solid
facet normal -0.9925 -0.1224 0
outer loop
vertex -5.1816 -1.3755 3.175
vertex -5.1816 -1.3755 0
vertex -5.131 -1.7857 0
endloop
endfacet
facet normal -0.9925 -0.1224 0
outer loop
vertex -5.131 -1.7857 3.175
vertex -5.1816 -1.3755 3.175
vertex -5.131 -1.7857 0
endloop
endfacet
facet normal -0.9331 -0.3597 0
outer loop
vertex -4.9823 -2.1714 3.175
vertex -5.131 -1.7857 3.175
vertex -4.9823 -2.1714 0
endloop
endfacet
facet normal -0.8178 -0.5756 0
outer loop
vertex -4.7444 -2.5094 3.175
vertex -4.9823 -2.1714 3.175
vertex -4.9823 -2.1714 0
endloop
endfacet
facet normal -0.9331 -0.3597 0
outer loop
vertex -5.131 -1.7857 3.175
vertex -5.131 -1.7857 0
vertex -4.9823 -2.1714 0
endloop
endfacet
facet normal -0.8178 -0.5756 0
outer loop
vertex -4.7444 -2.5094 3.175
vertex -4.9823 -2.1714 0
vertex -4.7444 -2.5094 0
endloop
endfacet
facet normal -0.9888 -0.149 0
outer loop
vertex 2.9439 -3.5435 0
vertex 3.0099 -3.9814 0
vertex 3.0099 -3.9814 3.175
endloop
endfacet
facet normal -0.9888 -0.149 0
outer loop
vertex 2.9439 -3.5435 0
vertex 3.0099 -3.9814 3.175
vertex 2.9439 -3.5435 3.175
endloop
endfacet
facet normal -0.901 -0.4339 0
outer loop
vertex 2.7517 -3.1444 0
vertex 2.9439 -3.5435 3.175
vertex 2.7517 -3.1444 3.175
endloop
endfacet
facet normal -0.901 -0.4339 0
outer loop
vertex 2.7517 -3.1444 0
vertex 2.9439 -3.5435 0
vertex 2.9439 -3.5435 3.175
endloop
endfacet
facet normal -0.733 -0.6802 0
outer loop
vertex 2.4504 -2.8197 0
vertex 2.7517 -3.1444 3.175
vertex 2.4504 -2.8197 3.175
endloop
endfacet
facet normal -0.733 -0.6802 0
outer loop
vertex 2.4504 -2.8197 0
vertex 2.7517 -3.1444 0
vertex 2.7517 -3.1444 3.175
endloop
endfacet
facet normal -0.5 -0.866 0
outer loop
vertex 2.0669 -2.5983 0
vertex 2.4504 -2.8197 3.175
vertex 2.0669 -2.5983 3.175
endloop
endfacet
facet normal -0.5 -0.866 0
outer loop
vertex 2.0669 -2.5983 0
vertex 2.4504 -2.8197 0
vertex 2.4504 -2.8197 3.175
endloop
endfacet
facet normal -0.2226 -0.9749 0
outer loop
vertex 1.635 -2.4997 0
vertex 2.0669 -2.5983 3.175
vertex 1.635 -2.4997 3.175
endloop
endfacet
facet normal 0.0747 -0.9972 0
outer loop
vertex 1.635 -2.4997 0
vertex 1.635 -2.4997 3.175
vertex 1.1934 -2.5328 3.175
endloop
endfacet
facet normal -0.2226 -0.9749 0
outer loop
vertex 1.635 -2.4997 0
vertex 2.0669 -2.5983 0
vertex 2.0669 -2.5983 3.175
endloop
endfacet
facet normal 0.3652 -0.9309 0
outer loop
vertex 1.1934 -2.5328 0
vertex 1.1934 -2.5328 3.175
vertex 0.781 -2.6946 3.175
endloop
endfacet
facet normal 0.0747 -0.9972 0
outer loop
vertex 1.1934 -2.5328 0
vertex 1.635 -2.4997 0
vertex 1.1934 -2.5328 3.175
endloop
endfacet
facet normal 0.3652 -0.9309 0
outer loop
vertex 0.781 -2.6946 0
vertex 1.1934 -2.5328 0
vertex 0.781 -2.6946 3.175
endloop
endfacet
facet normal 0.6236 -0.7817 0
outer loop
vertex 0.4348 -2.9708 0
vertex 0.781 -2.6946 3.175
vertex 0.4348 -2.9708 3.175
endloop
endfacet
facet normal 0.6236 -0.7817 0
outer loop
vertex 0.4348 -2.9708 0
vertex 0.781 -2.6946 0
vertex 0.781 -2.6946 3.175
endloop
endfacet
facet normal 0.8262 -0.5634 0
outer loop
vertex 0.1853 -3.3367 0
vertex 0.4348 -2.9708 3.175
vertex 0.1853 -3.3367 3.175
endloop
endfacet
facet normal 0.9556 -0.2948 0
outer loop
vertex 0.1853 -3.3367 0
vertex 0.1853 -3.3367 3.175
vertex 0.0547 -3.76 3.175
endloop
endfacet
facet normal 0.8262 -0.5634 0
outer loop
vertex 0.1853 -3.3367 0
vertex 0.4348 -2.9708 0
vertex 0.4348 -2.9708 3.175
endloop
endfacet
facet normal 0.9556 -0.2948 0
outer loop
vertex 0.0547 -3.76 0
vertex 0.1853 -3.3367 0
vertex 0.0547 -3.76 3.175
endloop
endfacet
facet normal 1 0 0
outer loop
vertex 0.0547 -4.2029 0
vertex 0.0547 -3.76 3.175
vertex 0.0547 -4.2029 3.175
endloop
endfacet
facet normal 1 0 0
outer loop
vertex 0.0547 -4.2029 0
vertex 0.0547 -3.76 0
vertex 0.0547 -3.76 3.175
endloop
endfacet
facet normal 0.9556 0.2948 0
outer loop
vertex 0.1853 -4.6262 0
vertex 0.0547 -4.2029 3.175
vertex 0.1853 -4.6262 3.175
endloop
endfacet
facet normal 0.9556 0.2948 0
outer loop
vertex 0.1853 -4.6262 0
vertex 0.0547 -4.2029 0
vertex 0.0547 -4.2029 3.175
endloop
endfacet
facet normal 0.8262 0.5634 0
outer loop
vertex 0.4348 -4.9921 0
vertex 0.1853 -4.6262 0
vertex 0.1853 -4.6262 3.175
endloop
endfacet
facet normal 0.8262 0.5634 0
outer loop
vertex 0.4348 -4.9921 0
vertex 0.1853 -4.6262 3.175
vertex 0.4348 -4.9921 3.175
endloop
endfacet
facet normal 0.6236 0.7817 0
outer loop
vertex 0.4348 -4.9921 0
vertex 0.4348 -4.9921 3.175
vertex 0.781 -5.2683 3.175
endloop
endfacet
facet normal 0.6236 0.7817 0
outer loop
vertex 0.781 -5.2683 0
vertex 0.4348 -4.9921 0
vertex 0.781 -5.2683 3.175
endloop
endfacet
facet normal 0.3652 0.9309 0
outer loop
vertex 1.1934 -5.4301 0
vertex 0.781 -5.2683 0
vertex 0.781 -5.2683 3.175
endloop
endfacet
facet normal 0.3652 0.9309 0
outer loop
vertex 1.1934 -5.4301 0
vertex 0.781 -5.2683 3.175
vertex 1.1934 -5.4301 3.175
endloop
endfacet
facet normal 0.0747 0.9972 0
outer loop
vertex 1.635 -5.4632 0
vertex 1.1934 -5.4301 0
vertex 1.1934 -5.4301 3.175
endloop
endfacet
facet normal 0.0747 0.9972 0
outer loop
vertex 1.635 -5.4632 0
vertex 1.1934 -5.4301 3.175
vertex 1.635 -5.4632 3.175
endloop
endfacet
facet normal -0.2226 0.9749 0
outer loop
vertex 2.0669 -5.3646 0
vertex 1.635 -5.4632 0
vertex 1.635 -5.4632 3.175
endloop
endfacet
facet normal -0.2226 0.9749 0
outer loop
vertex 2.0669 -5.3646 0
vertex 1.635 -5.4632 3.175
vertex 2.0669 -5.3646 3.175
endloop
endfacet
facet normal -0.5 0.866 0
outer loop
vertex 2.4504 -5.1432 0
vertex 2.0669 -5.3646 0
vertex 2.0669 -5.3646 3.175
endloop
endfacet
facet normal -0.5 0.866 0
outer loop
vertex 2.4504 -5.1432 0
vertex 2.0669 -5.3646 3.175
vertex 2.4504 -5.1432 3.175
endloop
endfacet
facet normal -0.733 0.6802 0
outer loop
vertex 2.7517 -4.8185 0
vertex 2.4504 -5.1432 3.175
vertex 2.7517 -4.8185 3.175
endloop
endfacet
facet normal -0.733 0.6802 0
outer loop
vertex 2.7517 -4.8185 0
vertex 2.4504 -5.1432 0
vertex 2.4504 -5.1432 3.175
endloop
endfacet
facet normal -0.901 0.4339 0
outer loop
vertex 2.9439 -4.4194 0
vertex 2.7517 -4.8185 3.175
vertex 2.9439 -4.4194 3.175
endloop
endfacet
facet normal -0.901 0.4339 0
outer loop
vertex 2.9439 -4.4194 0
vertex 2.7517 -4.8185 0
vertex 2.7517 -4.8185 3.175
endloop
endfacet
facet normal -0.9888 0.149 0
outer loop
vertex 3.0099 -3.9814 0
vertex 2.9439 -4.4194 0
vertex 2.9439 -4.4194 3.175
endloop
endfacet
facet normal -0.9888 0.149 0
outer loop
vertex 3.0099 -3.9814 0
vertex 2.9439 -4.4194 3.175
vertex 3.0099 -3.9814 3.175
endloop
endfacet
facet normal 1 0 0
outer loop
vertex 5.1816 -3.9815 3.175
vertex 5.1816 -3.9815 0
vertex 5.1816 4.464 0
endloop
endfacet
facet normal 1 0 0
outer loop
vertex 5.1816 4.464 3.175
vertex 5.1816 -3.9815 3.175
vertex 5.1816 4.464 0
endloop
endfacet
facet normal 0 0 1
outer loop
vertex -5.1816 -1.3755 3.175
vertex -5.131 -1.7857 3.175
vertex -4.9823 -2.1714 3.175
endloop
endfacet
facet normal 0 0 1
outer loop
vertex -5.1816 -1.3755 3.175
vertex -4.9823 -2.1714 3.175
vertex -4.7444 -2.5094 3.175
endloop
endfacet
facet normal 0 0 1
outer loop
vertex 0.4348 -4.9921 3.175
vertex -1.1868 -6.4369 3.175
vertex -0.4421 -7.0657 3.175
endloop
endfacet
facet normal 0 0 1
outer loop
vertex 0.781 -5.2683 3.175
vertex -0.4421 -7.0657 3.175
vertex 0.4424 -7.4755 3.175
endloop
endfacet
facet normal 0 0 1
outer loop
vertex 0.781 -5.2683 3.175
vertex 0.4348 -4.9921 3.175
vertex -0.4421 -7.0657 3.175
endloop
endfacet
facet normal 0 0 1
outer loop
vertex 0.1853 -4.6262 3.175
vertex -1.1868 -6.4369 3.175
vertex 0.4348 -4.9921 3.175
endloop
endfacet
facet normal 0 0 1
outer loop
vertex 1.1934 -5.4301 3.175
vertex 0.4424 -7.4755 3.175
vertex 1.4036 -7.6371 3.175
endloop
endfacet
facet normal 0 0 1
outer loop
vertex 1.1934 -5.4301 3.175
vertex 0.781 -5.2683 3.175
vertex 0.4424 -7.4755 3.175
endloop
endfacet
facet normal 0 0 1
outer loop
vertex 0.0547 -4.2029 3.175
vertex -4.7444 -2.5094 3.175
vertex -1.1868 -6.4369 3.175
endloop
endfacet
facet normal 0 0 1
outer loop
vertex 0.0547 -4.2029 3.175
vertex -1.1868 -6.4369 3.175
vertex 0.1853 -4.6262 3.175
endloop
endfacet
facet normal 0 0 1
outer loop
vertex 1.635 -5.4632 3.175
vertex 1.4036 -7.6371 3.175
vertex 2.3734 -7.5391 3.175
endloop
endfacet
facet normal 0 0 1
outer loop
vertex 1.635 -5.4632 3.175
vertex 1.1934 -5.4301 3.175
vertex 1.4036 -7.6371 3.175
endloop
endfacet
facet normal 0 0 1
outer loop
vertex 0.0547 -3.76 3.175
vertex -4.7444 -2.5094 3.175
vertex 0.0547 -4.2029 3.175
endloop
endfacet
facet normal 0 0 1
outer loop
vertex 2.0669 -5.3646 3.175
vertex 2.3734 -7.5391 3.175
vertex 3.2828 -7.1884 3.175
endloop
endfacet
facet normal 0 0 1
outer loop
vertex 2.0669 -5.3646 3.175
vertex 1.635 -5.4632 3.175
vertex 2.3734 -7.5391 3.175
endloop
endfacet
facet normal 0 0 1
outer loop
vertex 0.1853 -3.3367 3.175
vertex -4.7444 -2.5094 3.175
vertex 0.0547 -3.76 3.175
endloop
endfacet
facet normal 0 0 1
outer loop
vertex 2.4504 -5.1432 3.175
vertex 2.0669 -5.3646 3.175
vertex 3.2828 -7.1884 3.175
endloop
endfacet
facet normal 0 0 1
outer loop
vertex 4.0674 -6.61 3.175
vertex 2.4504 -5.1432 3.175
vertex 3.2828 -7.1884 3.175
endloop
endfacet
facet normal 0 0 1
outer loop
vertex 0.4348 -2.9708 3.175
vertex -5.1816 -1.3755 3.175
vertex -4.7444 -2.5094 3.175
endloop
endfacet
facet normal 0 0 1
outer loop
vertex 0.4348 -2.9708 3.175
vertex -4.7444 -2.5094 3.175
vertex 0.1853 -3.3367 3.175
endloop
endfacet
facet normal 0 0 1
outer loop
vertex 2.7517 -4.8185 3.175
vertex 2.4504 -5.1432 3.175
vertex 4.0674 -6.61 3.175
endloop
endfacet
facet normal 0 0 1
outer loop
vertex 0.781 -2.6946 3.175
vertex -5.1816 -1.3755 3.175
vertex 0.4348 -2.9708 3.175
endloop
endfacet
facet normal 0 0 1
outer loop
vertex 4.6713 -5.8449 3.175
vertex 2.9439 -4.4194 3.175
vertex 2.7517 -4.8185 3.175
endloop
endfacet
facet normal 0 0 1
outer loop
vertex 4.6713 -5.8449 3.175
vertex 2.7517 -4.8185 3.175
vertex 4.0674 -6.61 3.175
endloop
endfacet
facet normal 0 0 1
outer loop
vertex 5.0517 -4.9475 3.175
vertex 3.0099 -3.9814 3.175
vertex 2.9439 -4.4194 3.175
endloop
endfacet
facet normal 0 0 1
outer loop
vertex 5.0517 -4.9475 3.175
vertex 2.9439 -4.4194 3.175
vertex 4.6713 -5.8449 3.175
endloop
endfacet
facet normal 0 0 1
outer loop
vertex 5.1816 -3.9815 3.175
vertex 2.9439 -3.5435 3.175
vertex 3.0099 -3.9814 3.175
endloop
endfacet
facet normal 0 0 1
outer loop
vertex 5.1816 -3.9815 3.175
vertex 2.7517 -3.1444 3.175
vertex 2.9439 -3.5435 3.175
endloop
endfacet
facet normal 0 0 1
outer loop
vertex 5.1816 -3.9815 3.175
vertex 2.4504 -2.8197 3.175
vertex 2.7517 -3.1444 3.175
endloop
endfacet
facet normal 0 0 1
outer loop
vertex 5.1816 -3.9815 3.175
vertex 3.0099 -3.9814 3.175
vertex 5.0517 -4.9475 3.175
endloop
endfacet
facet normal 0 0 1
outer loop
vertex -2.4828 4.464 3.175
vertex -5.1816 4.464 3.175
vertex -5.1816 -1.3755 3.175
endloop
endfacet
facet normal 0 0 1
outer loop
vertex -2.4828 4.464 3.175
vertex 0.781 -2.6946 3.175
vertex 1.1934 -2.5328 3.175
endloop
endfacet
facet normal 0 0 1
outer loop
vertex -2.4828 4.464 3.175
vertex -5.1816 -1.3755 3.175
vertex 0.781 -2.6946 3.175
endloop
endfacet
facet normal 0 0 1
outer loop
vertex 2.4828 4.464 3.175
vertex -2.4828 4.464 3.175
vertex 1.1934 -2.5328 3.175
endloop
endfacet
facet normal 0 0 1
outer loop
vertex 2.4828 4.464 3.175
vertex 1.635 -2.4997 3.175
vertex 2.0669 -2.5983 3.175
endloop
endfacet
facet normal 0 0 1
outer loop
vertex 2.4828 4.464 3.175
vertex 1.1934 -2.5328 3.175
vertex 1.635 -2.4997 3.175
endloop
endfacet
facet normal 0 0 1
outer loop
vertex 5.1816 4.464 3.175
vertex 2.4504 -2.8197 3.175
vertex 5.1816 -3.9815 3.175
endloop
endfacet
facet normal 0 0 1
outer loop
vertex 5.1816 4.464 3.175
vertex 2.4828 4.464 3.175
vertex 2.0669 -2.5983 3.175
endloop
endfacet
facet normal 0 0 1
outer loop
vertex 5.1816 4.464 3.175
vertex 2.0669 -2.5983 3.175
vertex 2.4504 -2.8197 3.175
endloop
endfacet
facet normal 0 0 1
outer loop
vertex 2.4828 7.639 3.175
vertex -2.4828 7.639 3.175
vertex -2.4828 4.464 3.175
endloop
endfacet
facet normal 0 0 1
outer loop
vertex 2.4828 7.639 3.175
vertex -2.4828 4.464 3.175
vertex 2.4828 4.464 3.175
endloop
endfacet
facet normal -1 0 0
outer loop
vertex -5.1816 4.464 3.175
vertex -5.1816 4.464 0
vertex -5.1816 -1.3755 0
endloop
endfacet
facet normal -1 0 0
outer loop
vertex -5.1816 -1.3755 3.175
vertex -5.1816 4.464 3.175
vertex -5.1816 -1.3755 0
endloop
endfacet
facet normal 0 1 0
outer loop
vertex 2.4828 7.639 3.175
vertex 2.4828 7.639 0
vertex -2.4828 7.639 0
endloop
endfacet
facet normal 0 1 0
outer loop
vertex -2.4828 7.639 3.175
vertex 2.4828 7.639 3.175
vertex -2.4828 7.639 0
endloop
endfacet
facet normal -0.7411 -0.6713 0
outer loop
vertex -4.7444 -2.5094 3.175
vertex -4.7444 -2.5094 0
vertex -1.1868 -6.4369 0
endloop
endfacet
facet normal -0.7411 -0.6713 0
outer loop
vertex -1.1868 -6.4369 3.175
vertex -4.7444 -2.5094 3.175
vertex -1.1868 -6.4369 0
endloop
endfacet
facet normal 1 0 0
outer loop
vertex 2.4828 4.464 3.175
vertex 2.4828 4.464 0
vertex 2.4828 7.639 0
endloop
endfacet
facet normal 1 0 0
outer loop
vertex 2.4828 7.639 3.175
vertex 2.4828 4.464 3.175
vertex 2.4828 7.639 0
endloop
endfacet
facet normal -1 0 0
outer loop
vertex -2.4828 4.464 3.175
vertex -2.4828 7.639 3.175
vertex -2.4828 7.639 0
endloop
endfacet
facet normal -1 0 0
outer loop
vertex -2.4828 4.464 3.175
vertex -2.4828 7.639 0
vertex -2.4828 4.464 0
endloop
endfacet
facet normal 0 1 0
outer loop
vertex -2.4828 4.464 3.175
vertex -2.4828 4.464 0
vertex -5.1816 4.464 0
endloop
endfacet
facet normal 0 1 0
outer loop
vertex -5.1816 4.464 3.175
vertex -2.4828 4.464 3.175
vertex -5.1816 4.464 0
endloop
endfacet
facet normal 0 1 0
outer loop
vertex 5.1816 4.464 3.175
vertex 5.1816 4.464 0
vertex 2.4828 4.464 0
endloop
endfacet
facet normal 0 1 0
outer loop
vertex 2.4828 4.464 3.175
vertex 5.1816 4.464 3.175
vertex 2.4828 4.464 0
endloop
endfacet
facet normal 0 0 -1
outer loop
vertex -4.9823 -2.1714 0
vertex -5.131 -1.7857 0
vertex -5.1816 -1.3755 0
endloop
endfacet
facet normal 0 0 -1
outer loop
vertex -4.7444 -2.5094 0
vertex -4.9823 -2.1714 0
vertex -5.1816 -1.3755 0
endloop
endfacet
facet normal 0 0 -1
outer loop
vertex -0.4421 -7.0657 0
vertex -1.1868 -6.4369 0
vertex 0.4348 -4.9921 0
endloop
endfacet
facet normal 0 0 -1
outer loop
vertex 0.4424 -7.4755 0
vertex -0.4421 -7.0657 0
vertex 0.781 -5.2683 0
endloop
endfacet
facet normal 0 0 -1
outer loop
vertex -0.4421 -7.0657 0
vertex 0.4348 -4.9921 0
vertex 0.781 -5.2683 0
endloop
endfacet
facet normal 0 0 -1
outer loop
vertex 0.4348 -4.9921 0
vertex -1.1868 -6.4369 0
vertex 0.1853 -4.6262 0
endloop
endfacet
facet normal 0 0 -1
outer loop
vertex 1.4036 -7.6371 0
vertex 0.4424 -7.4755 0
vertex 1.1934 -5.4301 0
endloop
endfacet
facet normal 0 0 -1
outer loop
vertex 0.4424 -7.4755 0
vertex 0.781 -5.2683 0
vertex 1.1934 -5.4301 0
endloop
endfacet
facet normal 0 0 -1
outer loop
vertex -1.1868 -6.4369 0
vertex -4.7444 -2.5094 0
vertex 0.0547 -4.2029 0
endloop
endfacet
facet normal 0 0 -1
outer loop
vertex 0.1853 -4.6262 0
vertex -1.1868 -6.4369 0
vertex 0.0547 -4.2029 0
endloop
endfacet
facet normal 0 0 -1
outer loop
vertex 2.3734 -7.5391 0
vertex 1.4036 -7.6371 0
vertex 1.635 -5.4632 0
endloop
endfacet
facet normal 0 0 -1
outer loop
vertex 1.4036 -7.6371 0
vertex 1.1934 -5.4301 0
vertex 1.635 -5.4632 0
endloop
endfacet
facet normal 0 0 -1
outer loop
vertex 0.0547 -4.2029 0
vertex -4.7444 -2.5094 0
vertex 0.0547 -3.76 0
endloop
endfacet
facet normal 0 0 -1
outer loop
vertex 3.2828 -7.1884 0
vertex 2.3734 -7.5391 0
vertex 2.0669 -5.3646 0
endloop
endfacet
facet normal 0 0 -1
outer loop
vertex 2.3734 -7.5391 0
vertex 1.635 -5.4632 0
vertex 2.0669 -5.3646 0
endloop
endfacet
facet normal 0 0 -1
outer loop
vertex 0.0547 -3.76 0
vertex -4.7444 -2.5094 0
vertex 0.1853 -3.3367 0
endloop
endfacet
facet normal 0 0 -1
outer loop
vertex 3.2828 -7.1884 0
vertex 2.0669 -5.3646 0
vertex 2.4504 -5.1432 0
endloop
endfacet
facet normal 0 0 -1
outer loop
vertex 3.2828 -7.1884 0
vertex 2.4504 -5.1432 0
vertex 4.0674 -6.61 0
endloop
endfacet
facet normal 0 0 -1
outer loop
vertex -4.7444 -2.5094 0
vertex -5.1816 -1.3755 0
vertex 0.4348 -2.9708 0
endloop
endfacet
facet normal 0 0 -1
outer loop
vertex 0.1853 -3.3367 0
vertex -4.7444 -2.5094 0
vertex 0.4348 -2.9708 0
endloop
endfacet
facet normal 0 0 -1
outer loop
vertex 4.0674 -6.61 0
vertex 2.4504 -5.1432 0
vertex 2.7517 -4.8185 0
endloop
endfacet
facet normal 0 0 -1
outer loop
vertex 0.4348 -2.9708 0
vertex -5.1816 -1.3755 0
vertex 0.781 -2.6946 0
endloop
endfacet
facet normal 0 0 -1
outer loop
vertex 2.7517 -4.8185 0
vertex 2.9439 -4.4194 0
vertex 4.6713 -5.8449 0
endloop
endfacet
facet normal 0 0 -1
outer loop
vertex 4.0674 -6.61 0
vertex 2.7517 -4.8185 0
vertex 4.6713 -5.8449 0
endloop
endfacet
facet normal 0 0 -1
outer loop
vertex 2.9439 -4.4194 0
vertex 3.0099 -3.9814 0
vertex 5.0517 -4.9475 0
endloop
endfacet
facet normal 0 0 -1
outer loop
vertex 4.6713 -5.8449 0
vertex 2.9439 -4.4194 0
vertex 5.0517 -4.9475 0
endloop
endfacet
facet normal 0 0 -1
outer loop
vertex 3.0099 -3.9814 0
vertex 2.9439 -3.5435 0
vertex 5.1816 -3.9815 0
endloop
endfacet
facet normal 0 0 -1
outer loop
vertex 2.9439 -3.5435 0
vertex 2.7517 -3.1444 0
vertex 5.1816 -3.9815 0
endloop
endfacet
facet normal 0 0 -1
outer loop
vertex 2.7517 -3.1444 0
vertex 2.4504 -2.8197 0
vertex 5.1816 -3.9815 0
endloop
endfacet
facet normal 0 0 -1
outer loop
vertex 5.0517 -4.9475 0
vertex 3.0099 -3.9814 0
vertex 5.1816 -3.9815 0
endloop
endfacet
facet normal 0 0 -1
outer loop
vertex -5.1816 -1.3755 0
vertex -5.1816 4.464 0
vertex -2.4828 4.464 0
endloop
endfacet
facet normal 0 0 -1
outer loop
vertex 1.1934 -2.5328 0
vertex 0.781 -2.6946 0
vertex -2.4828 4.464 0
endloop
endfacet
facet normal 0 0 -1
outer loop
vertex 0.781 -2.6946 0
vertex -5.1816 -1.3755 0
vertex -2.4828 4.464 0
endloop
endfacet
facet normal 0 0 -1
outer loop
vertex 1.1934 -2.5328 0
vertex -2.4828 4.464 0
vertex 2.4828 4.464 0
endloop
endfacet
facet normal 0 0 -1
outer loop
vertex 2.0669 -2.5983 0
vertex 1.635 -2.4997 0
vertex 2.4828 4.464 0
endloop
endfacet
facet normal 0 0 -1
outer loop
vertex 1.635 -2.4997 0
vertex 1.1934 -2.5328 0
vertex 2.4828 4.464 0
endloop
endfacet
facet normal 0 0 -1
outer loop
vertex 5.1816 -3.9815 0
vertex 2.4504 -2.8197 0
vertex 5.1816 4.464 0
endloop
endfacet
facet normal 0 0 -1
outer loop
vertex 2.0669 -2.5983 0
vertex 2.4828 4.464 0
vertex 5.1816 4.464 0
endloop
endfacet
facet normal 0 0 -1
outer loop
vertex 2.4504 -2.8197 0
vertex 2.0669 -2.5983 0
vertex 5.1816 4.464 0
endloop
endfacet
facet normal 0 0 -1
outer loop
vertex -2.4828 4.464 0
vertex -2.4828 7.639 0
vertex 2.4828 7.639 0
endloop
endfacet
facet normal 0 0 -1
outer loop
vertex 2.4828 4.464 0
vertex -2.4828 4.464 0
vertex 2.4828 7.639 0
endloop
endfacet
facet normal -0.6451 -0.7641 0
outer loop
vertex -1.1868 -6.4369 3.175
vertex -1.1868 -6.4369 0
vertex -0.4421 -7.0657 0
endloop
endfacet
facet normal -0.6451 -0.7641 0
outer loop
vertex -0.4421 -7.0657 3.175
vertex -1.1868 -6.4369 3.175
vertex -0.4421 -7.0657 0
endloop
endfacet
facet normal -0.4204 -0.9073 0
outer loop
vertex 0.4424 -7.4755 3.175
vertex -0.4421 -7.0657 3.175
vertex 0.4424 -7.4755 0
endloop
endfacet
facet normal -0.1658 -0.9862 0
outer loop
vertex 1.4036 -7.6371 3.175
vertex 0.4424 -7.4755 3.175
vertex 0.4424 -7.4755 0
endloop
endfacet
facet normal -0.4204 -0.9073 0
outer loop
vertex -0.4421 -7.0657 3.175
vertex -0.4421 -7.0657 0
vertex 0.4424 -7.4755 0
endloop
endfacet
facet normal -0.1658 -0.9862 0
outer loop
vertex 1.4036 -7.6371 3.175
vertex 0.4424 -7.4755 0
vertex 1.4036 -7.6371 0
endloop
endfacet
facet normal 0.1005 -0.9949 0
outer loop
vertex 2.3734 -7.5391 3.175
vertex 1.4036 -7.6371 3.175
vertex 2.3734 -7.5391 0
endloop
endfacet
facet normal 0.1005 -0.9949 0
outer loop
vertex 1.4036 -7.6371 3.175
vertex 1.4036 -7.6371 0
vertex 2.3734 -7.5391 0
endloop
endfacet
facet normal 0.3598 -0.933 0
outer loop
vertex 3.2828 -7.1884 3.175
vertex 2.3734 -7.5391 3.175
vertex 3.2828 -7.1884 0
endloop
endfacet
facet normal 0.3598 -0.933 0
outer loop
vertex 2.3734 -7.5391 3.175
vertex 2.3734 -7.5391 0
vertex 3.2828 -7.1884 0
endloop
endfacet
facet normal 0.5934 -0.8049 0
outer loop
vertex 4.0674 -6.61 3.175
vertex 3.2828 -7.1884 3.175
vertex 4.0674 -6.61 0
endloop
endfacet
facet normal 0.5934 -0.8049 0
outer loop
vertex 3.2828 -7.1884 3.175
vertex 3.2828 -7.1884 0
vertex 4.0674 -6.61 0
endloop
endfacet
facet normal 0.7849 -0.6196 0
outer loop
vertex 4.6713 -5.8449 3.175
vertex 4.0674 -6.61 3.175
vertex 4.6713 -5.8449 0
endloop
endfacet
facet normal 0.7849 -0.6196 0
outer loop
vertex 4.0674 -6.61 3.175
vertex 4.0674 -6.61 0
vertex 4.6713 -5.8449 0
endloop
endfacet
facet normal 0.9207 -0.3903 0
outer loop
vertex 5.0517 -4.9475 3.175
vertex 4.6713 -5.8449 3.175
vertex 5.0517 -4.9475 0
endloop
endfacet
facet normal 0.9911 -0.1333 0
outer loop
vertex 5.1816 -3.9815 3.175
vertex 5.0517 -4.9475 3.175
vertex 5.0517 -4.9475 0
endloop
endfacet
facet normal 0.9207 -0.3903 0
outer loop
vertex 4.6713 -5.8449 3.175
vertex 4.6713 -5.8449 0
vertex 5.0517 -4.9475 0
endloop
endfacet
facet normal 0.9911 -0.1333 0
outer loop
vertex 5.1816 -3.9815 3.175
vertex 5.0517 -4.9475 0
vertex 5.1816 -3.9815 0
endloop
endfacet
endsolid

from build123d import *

# Parameters (mm, degrees)
SKETCH1_R           = 1.4859
BOSS_EXTRUDE1_DEPTH = 3.175


with BuildPart() as part:
    # Sketch1 → Boss-Extrude1 (new body)
    with BuildSketch(Plane.XY):
        with BuildLine():
            Line((-4.744382059, -2.509411554), (-1.186842353, -6.436927856))
            ThreePointArc((-1.186842353, -6.436927856), (2.839838282, -7.394162612), (5.1816, -3.98145))
            Line((5.1816, -3.98145), (5.1816, 4.46405))
            Line((5.1816, 4.46405), (2.48285, 4.46405))
            Line((2.48285, 4.46405), (2.48285, 7.63905))
            Line((2.48285, 7.63905), (-2.48285, 7.63905))
            Line((-2.48285, 7.63905), (-2.48285, 4.46405))
            Line((-2.48285, 4.46405), (-5.1816, 4.46405))
            Line((-5.1816, 4.46405), (-5.1816, -1.375458239))
            ThreePointArc((-5.1816, -1.375458239), (-5.068509644, -1.983119668), (-4.744382059, -2.509411554))
        make_face()
        with Locations((1.524, -3.98145)):
            Circle(SKETCH1_R, mode=Mode.SUBTRACT)
    extrude(amount=BOSS_EXTRUDE1_DEPTH)


solid = part.part
